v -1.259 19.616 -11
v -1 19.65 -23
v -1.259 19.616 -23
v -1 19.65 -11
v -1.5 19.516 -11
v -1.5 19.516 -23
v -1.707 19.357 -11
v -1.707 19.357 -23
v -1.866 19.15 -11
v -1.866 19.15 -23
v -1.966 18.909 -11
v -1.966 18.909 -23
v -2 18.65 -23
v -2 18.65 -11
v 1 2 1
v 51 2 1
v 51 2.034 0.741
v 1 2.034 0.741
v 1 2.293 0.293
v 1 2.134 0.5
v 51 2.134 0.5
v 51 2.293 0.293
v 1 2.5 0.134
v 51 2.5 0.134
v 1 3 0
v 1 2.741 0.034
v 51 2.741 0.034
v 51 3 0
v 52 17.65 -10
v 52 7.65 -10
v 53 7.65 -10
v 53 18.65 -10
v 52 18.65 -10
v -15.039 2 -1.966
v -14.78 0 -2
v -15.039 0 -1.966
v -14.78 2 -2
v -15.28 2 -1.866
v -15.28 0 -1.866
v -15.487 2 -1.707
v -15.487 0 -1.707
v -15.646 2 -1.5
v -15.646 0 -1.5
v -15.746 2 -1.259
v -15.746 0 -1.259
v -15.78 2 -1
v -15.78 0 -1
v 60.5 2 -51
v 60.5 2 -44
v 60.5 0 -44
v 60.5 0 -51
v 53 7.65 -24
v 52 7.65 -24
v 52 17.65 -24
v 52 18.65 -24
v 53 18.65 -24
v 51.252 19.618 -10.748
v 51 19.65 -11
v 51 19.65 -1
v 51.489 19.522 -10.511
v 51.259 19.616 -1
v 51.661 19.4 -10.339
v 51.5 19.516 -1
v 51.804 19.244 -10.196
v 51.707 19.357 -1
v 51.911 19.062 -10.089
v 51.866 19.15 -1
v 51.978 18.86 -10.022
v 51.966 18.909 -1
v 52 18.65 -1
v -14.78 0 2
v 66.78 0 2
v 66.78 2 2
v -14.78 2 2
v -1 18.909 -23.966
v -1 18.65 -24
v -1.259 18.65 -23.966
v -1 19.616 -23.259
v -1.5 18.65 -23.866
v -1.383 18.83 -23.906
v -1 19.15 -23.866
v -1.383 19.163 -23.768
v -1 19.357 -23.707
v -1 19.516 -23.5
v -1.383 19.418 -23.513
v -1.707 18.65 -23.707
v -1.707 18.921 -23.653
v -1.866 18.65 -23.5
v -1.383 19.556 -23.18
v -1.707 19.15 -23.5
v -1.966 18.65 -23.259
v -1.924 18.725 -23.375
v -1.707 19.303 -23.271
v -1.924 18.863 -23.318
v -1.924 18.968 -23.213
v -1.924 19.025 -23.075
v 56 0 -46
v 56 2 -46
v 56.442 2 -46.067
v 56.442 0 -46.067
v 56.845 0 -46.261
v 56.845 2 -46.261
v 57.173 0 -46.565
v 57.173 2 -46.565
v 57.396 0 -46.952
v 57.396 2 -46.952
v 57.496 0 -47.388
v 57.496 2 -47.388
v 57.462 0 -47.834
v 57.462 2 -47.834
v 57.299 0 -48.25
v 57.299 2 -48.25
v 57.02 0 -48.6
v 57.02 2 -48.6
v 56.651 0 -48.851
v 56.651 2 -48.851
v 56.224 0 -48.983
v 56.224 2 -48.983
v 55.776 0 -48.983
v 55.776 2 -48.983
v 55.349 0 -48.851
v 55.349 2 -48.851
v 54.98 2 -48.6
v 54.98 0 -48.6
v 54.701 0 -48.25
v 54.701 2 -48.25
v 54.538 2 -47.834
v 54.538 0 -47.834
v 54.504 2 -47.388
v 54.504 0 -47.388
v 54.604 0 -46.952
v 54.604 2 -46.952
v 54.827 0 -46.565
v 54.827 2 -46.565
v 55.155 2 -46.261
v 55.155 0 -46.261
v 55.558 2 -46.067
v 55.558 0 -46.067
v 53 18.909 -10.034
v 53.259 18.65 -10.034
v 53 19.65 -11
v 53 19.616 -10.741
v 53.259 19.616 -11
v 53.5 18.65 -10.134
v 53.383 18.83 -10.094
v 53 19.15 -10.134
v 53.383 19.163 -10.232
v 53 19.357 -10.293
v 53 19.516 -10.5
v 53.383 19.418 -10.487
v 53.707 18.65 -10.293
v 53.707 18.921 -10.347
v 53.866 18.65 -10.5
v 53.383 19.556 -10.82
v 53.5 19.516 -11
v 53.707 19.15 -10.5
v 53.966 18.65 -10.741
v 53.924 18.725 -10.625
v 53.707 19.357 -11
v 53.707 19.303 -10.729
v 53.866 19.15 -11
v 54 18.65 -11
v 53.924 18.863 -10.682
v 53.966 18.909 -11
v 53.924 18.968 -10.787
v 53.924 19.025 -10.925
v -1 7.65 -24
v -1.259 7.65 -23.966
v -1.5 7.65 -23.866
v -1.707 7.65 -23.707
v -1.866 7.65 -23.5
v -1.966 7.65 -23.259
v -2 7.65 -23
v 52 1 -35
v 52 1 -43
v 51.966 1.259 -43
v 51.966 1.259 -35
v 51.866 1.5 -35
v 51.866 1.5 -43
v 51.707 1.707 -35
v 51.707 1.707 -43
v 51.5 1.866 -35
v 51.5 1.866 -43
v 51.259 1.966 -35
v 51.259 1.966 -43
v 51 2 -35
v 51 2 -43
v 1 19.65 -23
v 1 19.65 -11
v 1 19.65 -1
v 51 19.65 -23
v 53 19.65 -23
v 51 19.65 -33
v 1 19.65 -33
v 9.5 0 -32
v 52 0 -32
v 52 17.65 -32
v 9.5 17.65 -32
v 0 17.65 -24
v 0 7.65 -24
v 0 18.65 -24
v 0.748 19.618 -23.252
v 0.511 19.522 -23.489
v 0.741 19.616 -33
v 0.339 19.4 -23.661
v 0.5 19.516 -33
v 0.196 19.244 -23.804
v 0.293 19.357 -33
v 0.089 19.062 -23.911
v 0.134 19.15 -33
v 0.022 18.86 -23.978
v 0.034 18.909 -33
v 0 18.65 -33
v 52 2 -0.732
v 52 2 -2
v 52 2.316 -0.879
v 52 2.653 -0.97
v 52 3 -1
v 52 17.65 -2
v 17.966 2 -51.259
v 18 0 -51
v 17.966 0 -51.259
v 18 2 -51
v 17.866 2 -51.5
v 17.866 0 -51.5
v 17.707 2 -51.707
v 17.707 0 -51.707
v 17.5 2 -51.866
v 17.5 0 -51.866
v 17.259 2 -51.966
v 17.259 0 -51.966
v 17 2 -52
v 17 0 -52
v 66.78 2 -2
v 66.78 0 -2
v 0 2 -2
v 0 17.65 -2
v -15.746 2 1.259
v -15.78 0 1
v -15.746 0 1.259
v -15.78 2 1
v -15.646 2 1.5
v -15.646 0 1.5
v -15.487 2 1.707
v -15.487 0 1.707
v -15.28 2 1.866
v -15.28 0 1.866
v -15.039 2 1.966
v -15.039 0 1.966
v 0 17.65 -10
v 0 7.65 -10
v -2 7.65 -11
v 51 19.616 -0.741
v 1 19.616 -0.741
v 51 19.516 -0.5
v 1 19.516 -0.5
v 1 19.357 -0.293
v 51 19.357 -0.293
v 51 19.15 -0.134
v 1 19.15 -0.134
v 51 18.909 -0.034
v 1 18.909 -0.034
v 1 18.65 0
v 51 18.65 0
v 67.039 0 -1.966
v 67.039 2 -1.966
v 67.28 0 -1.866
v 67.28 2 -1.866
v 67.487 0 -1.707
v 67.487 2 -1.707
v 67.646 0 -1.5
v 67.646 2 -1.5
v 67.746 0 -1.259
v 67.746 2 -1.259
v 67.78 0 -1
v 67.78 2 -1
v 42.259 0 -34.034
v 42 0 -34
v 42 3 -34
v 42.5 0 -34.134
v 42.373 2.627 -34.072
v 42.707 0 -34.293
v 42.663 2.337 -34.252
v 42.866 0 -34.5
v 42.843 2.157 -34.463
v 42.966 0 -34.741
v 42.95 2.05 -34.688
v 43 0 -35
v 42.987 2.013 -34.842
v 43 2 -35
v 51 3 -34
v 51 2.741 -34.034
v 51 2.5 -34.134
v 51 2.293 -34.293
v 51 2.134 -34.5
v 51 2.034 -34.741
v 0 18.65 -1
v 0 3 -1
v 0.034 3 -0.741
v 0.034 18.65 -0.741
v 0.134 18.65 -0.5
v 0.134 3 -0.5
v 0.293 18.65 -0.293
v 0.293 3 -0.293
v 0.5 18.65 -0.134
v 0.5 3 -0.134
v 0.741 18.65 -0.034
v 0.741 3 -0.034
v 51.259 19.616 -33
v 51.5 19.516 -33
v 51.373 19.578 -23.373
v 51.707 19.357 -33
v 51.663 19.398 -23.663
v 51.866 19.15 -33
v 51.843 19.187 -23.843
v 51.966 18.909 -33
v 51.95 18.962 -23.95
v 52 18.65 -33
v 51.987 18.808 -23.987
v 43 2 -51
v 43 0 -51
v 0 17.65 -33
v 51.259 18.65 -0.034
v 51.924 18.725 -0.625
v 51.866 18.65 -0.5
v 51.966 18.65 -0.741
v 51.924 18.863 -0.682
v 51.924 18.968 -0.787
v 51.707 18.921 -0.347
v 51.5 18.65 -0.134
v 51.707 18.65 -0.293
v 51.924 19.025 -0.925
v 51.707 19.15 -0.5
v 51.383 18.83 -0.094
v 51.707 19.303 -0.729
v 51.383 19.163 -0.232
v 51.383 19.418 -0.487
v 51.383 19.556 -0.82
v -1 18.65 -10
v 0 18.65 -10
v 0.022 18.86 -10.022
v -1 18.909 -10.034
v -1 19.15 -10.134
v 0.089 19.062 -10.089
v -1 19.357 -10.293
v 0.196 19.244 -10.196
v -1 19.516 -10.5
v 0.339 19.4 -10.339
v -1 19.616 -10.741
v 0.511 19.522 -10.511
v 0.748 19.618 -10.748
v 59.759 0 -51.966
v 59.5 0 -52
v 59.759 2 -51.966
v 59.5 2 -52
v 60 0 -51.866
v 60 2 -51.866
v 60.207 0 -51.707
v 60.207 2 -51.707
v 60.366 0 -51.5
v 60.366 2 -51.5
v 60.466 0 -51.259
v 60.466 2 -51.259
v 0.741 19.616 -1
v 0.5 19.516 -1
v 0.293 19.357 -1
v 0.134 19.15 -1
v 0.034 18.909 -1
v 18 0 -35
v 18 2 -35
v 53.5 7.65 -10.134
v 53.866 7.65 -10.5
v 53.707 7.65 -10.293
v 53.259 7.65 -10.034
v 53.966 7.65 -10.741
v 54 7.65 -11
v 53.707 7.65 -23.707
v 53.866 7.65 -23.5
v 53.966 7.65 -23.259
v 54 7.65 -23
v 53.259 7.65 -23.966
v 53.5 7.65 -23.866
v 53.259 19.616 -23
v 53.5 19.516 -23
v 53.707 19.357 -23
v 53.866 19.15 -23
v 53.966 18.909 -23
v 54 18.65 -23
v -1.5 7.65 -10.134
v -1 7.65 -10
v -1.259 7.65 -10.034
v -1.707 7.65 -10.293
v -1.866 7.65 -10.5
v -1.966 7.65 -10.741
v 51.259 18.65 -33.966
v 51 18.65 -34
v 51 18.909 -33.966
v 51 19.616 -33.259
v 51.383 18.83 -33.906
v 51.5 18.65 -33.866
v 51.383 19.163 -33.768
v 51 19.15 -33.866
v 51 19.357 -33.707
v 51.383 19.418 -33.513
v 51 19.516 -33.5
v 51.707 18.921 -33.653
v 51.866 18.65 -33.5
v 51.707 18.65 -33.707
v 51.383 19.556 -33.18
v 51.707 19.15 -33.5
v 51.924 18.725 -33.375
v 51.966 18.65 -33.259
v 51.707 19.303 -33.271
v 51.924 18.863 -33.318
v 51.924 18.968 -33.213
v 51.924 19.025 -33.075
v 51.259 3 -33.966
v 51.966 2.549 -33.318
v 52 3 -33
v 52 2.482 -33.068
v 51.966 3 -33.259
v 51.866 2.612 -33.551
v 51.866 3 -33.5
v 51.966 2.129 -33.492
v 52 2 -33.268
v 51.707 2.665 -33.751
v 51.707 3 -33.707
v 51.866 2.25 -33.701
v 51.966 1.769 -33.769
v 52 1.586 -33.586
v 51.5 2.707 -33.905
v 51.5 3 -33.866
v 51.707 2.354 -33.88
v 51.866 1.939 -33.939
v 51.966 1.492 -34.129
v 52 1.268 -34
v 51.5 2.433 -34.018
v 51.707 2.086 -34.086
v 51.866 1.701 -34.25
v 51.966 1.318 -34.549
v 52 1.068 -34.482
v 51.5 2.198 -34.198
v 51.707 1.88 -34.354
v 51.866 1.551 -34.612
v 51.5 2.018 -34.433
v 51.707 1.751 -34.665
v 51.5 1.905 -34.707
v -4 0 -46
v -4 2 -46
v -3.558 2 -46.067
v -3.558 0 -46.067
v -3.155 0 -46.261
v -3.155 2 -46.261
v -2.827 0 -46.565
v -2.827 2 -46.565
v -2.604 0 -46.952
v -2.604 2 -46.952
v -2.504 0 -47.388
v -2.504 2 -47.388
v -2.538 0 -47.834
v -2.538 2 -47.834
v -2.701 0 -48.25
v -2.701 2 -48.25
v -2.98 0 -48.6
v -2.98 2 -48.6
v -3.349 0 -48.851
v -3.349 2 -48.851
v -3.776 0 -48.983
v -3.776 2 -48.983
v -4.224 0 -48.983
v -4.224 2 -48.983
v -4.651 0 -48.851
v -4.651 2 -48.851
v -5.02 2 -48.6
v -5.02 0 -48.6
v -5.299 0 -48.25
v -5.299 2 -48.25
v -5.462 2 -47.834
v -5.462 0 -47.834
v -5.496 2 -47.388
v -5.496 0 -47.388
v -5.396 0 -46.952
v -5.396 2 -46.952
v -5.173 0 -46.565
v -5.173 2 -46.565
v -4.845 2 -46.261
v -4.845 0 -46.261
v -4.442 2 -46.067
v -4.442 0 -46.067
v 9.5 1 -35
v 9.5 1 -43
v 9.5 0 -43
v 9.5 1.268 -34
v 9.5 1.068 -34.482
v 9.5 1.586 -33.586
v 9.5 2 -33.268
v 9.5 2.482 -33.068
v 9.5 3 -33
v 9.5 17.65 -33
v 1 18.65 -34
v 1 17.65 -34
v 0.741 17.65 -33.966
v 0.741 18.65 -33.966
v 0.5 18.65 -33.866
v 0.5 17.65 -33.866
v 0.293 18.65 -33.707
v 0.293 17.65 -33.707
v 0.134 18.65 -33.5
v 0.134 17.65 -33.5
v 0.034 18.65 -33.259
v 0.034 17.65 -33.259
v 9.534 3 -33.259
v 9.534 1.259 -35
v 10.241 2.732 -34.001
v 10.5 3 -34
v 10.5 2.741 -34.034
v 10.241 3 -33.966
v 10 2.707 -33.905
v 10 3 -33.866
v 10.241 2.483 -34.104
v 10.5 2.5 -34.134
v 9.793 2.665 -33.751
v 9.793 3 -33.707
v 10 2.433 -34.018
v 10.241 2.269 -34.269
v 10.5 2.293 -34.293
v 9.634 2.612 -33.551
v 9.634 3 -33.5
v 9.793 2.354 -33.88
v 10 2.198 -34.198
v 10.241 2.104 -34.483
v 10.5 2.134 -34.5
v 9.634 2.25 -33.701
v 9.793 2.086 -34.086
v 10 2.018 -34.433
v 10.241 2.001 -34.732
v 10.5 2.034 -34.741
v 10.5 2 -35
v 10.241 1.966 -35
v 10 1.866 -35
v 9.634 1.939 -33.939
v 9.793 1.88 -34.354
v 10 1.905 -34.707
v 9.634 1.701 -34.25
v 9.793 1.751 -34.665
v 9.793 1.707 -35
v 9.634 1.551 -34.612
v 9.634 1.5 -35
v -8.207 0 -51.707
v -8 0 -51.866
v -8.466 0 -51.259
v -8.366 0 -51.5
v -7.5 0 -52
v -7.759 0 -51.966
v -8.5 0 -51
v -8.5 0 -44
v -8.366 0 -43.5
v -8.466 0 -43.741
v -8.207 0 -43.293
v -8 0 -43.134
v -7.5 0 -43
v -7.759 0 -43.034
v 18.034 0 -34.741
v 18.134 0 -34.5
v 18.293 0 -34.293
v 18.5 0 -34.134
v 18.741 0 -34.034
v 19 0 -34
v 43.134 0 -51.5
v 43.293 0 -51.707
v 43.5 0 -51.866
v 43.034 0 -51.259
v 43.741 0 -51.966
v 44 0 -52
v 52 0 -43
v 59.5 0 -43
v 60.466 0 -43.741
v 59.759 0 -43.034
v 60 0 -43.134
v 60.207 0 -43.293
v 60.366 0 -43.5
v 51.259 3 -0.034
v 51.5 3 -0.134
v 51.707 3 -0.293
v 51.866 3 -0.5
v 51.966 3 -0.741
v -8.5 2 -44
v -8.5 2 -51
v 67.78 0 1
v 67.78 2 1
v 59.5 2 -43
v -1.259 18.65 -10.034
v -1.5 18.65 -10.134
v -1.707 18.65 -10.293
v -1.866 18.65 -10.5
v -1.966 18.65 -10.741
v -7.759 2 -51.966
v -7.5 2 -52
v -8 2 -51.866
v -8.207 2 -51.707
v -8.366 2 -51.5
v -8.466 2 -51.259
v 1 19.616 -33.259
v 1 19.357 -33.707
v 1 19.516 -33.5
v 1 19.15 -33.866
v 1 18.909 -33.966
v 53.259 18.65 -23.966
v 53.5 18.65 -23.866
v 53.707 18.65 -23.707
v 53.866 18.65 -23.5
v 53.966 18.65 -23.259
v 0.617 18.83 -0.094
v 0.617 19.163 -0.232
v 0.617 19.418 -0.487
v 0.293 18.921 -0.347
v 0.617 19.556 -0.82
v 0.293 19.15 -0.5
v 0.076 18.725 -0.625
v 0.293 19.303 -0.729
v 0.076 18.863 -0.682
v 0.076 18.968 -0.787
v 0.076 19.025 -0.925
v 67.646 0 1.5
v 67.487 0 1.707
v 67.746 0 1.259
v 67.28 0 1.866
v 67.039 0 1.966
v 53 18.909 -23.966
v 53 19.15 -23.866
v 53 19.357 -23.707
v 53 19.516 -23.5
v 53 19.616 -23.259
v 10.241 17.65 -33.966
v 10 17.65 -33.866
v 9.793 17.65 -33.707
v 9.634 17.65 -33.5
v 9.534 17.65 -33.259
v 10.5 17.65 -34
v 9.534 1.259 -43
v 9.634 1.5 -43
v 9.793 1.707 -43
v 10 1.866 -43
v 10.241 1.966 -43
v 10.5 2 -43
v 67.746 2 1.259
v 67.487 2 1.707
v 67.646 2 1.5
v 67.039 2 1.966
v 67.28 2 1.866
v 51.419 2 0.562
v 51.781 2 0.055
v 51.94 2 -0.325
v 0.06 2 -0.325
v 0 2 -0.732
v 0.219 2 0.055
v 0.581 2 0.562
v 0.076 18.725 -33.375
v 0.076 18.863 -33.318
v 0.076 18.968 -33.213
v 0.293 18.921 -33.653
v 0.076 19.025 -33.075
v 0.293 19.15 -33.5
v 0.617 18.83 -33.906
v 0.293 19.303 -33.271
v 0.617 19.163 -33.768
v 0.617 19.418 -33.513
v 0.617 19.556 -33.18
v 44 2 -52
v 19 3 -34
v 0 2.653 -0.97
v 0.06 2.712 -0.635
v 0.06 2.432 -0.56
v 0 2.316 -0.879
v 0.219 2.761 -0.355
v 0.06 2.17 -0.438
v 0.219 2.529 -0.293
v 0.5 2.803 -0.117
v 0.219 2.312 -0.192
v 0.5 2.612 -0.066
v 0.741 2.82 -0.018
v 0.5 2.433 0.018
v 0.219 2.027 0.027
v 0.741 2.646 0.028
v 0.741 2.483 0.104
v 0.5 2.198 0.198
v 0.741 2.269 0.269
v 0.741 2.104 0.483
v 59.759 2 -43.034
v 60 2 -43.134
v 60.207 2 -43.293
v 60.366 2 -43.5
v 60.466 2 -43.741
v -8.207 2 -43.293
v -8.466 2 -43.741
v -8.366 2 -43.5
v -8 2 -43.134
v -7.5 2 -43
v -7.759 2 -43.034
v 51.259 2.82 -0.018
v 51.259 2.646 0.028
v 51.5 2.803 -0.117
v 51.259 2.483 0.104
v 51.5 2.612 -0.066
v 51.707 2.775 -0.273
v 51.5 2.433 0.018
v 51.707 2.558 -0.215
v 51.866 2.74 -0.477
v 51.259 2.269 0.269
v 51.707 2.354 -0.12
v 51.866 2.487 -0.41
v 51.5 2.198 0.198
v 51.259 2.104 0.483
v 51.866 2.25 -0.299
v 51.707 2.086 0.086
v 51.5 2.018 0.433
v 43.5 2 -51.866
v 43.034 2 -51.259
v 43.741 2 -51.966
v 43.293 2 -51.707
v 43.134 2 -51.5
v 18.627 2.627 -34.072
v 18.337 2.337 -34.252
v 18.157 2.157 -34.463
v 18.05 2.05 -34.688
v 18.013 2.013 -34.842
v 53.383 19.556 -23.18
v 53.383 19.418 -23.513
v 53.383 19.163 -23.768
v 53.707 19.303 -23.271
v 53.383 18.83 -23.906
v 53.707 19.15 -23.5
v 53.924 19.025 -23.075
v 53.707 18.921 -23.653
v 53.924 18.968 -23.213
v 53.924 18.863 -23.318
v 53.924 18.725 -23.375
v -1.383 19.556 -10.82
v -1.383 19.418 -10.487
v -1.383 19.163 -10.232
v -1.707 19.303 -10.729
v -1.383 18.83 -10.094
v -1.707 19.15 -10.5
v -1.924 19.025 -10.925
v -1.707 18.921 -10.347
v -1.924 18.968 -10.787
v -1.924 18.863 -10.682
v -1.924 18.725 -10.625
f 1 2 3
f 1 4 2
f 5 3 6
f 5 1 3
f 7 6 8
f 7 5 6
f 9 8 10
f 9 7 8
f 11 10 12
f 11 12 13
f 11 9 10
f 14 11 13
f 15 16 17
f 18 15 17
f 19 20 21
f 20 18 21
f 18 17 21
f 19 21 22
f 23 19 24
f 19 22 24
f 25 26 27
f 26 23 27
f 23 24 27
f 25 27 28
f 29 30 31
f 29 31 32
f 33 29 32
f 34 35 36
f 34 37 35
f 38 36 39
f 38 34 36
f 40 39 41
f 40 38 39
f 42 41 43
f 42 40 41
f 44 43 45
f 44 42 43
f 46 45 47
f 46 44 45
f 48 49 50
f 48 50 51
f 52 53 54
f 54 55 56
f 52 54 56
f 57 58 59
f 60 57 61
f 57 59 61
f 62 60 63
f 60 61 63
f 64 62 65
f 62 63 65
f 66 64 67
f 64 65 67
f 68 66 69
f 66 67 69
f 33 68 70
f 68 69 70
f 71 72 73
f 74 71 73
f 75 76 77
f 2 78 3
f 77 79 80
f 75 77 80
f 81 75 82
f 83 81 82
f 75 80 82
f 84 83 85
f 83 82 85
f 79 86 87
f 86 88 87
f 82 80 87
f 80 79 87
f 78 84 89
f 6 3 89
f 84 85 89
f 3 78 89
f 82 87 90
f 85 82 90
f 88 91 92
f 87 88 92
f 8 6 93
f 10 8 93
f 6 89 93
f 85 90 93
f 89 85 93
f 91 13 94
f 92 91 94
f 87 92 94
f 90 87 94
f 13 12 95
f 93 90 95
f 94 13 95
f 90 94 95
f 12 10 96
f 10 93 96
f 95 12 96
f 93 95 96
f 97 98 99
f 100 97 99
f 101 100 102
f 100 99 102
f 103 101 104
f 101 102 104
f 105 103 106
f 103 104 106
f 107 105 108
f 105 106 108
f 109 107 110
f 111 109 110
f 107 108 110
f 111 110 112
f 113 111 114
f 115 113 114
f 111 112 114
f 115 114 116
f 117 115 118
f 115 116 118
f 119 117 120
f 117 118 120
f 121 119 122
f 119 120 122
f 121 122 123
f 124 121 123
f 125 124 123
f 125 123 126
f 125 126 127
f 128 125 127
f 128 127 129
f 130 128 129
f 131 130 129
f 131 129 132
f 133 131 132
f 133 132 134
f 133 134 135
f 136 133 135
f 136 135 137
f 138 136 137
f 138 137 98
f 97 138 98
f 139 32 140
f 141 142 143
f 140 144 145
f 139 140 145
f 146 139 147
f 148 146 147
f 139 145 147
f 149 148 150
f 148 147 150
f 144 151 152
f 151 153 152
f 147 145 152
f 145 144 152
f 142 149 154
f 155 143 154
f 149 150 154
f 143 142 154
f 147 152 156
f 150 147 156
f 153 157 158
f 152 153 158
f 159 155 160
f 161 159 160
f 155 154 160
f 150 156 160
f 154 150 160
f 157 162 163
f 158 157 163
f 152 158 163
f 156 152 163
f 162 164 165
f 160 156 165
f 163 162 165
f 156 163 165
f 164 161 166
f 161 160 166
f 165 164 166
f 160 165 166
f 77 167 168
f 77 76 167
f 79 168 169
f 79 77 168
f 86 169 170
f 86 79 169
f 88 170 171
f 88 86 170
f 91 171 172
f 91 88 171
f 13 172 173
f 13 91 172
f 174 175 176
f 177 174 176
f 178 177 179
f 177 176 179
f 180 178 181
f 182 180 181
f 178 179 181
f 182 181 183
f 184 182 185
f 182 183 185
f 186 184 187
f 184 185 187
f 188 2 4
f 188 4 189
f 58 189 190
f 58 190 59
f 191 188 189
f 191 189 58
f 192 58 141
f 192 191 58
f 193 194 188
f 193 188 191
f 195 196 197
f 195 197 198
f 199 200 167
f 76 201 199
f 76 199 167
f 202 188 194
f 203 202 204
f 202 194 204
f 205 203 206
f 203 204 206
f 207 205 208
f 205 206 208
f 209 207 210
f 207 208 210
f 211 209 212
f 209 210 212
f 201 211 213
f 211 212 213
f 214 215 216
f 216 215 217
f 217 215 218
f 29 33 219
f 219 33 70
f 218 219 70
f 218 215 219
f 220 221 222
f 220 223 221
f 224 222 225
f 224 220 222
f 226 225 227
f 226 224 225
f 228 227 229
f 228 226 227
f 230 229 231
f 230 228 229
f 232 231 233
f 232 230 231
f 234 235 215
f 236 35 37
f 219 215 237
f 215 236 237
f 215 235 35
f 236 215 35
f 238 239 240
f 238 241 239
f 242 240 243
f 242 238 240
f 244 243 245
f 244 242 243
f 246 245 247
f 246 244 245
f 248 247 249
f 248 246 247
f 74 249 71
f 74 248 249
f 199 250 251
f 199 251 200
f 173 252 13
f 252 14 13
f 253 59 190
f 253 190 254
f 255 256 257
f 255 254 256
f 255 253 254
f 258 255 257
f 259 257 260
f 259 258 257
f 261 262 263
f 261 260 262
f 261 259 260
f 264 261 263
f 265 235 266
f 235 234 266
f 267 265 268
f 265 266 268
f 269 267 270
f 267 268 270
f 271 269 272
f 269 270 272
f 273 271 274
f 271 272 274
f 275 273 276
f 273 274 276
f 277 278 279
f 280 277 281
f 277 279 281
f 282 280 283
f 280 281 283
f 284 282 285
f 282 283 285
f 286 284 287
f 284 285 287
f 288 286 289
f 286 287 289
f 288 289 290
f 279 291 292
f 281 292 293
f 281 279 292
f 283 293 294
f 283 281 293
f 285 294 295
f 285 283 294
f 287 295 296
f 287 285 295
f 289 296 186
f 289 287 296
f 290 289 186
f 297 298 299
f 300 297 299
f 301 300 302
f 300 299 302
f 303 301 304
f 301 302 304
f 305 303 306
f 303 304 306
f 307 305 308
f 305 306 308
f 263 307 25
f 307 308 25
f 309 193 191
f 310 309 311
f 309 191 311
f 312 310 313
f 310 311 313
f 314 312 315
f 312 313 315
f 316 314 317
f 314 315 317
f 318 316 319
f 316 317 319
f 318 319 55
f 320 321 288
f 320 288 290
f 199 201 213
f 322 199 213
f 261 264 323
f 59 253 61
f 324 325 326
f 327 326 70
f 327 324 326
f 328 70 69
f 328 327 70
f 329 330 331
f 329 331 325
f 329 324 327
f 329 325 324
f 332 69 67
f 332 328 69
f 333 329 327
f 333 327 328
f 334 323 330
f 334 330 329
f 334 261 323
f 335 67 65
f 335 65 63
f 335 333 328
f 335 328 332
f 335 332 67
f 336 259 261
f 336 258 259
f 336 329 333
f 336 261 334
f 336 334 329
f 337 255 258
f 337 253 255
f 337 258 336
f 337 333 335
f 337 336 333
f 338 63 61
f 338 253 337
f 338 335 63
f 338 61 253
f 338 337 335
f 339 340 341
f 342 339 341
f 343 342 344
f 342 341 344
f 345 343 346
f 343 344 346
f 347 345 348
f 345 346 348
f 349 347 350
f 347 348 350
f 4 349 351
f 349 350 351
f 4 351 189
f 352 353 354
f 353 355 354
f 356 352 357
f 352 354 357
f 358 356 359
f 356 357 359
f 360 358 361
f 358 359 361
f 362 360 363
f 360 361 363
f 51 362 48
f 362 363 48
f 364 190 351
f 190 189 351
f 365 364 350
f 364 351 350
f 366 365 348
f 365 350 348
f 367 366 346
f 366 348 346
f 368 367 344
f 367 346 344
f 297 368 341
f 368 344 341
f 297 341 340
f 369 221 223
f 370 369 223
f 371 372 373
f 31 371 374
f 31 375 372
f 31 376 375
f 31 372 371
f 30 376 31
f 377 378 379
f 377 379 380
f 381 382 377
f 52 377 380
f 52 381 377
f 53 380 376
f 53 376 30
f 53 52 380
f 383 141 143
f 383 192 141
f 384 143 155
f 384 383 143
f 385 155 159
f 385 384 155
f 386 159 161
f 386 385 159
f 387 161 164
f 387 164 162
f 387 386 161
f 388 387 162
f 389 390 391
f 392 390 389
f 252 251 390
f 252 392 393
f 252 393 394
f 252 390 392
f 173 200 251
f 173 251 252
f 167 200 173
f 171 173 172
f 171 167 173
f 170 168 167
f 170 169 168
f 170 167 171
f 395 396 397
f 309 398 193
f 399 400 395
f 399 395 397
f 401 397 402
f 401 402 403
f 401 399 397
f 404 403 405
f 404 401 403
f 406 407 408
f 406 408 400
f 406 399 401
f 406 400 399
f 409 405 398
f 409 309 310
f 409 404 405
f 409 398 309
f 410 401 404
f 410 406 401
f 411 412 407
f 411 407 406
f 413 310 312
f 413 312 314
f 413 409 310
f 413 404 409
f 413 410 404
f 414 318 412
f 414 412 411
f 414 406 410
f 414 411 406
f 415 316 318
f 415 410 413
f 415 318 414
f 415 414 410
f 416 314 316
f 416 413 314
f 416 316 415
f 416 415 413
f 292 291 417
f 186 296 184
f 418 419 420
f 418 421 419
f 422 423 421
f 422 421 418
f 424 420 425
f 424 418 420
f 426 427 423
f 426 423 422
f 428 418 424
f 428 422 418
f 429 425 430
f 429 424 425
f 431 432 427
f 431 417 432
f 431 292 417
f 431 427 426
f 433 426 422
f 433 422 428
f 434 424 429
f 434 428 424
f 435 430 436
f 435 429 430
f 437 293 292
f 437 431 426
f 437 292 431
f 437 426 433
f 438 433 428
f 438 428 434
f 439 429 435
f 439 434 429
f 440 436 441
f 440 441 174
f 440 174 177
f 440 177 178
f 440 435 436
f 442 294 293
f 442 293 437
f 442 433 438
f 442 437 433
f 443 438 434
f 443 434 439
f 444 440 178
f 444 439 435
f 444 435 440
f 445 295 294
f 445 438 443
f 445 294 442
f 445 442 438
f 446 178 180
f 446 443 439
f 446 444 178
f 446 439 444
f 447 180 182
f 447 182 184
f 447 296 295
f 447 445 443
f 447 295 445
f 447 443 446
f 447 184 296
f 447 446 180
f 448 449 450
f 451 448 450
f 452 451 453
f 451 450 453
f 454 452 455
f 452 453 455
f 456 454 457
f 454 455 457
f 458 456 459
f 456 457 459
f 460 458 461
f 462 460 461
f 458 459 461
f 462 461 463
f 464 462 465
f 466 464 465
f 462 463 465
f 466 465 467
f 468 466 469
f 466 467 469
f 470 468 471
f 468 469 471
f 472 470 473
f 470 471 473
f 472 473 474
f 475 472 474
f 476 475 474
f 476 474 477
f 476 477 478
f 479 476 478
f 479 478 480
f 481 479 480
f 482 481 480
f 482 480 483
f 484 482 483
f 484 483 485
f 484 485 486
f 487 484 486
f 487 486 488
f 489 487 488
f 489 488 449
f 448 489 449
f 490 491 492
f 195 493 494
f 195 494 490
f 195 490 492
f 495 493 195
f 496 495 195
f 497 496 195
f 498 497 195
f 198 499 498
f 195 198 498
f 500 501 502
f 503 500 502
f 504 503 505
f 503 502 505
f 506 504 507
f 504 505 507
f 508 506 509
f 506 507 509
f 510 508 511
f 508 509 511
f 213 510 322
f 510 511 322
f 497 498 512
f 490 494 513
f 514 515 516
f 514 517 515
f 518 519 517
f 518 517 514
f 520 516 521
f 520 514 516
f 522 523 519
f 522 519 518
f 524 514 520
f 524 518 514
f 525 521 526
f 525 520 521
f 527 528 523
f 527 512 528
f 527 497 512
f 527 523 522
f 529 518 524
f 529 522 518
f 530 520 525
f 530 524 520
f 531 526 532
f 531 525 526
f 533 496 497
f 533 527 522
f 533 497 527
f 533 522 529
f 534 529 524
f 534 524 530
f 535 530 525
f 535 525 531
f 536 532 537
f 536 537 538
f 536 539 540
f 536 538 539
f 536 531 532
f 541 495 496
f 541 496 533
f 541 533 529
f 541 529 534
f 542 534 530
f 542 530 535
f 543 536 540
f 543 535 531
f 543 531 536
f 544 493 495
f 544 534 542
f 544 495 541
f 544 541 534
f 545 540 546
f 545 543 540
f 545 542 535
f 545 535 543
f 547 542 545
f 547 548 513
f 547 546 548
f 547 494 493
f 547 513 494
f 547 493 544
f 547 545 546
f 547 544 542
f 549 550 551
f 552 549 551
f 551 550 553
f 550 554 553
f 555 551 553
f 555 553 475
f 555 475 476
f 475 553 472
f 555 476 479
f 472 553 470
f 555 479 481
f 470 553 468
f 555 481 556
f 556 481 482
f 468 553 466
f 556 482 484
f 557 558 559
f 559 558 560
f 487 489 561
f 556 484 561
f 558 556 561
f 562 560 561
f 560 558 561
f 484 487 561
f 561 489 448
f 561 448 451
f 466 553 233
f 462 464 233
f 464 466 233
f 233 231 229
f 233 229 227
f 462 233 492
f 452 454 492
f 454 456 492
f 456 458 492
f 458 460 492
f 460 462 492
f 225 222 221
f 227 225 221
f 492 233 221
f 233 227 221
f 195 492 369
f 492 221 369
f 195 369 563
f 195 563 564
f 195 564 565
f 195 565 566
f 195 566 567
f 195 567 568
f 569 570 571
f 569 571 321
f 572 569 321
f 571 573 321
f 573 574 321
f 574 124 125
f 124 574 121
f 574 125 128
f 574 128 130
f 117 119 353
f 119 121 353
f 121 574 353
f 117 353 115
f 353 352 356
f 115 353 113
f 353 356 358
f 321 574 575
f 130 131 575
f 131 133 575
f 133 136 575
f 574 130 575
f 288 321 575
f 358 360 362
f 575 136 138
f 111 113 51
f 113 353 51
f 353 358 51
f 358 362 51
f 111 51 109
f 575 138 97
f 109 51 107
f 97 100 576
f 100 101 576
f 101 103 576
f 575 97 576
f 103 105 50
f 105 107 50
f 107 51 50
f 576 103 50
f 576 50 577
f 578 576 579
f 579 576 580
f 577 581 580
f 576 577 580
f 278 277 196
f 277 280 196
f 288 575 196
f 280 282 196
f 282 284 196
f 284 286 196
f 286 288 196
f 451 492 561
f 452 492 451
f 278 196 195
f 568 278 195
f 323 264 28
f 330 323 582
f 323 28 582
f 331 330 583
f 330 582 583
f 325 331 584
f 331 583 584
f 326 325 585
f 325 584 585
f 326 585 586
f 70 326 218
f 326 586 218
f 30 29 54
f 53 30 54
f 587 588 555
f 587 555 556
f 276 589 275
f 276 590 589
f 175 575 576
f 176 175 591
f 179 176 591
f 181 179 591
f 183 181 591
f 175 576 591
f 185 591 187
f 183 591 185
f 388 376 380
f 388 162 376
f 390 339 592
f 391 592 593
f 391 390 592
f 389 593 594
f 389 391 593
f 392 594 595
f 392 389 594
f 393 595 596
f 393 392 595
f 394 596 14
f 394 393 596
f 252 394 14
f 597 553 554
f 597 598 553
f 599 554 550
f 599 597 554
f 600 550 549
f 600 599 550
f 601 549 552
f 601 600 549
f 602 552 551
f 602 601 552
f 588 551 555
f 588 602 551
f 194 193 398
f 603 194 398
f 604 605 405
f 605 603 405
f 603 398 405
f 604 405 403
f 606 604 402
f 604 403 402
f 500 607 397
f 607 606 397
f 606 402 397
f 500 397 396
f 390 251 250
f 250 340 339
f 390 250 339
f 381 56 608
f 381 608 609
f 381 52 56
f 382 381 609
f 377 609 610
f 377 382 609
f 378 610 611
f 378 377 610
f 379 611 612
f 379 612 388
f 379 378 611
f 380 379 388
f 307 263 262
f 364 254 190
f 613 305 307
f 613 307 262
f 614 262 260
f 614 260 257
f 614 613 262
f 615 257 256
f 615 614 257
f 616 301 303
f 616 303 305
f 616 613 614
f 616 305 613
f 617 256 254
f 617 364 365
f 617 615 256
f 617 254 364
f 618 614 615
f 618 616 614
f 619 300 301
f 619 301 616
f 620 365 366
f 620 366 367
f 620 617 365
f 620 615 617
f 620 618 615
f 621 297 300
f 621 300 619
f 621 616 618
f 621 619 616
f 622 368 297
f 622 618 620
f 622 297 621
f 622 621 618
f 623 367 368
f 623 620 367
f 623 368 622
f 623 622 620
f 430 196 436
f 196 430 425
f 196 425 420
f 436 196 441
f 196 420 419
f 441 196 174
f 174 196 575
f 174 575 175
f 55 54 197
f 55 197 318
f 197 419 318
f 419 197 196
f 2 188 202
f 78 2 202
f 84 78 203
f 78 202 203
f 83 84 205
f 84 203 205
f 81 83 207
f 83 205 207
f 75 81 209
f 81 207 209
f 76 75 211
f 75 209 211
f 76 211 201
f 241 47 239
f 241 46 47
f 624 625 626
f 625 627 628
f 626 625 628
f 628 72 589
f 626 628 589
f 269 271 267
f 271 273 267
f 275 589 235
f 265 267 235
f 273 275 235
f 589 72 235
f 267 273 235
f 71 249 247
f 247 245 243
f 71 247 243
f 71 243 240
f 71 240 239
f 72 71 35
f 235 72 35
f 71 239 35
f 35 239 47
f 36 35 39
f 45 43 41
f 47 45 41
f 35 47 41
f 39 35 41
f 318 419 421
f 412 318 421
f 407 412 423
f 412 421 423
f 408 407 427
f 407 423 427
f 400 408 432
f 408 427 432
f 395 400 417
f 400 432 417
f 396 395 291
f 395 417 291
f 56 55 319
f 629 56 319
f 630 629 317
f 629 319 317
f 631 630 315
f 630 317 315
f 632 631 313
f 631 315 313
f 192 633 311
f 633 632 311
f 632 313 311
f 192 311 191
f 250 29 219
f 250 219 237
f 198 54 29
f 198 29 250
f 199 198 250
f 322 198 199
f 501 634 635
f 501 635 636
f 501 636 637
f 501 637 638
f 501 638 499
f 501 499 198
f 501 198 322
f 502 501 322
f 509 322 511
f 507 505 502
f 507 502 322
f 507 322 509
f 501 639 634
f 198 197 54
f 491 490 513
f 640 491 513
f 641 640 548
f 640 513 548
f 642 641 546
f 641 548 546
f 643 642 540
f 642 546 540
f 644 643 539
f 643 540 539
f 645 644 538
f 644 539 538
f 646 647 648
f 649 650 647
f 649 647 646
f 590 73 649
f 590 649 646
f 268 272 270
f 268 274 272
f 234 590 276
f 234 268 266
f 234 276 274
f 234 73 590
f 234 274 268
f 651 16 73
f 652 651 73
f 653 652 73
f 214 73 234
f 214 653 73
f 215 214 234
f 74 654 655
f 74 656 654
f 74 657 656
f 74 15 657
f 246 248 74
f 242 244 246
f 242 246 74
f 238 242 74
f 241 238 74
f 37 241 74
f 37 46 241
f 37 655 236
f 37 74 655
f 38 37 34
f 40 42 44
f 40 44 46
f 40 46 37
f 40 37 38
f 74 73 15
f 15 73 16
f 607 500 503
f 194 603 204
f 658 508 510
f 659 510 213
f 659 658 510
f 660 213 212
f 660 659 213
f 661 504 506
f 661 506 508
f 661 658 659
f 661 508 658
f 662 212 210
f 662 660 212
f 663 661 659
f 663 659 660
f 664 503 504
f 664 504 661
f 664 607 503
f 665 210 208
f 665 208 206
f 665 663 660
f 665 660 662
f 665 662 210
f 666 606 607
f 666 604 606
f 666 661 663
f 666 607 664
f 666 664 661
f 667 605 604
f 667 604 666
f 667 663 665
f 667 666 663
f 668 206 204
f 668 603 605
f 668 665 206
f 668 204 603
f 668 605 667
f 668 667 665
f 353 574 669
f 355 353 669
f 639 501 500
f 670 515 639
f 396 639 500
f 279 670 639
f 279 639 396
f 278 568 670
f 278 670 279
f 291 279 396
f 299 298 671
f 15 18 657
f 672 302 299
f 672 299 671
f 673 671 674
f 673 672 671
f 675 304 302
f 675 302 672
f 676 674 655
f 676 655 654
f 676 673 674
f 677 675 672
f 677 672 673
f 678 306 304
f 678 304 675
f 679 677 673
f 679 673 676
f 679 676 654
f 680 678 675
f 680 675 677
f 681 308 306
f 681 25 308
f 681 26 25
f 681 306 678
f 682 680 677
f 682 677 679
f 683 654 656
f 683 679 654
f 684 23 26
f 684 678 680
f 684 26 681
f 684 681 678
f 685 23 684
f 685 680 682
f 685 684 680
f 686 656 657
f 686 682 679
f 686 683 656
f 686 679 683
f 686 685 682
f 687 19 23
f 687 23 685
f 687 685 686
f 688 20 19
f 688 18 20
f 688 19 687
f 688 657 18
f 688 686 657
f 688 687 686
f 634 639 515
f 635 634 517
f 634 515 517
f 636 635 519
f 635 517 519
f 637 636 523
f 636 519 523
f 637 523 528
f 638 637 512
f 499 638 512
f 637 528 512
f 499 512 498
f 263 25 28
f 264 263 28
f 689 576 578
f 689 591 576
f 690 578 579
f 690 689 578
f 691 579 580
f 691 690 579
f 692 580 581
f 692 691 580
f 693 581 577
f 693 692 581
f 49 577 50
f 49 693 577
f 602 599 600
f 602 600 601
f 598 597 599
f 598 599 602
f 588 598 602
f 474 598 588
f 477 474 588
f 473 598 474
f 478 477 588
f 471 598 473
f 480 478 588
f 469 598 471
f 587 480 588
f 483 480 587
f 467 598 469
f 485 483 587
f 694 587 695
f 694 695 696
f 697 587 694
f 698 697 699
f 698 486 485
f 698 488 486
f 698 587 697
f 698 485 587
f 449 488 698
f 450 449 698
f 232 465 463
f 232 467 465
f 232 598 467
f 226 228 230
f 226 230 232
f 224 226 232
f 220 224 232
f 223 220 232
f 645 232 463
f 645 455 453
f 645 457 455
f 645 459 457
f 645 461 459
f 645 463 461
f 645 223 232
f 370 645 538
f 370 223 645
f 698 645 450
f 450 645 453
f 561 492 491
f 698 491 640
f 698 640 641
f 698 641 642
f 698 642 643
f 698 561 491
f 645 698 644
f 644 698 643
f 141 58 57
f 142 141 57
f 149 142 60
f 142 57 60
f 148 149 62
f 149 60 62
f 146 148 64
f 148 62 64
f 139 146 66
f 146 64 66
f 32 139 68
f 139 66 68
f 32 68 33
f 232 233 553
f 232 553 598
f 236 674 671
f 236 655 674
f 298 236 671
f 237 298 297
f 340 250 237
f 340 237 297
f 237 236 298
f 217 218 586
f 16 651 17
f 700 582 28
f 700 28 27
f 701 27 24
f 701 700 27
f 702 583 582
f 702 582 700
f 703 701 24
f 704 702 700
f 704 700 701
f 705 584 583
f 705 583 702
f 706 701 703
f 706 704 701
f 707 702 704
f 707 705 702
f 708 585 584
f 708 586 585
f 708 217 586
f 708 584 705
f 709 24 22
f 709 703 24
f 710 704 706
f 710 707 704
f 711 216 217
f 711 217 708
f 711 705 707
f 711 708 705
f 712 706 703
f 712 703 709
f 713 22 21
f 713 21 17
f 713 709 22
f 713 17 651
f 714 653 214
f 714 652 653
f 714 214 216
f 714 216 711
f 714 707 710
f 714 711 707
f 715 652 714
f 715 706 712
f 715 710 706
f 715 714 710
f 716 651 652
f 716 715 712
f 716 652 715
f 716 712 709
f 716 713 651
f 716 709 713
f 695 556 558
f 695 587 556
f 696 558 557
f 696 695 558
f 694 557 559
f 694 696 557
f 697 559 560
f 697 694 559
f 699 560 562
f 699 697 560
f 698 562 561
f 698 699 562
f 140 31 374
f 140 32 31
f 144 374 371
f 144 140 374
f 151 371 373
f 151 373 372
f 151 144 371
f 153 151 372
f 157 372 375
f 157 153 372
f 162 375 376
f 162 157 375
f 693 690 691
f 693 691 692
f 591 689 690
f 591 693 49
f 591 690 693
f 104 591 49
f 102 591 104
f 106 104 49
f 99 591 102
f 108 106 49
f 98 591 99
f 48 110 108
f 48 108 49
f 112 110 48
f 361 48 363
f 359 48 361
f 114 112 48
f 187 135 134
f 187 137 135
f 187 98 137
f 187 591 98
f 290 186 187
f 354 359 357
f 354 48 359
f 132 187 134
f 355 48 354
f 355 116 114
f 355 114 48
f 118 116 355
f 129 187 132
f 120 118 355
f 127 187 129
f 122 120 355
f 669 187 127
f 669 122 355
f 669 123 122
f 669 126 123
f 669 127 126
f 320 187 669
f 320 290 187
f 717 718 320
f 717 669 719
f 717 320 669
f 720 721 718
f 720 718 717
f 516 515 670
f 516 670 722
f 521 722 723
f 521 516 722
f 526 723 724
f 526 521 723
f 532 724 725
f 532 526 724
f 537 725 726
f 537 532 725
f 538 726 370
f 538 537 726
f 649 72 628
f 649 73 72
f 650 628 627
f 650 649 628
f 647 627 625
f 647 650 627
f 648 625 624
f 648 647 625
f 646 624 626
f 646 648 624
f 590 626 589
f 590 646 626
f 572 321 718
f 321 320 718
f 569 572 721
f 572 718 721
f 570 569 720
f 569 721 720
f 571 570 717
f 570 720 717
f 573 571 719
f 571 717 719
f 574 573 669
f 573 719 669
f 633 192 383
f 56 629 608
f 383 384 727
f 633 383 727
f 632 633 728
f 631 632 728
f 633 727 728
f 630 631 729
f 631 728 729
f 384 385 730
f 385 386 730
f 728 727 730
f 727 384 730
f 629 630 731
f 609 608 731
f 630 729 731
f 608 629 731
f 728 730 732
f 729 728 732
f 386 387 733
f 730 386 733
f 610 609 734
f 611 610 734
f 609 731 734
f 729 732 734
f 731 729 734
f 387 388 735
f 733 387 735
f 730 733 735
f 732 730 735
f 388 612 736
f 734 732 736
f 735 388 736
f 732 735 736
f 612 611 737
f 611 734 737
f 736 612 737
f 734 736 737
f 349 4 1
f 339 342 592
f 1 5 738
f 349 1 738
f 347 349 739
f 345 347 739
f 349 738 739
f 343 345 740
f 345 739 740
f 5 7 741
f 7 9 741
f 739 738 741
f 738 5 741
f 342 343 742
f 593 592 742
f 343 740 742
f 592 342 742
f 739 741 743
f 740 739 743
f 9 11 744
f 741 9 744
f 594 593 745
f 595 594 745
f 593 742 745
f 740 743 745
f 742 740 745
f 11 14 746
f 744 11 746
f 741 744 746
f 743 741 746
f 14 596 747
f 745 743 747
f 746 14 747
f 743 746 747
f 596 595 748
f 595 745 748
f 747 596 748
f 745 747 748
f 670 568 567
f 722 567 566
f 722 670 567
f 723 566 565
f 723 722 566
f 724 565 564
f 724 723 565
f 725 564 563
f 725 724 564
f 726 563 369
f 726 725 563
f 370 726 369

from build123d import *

# Parameters (mm, degrees)
SKETCH1_W            = 52
SKETCH1_H            = 34
BOSS_EXTRUDE1_DEPTH  = 19.65
SKETCH2_W            = 52
SKETCH2_H            = 30
CUT_EXTRUDE1_DEPTH   = 17.65
SKETCH3_W            = 9
SKETCH3_H            = 2
SKETCH3_W_2          = 18
BOSS_EXTRUDE2_DEPTH  = 18
SKETCH4_W            = 18
SKETCH4_H            = 2
BOSS_EXTRUDE3_DEPTH  = 8.5
SKETCH5_W            = 18
SKETCH5_H            = 2
BOSS_EXTRUDE4_DEPTH  = 8.5
SKETCH6_R            = 1.5
CUT_EXTRUDE2_DEPTH   = 82.705400678
SKETCH7_W            = 52
SKETCH7_H            = 2
BOSS_EXTRUDE5_DEPTH  = 2
SKETCH8_W            = 4
SKETCH8_H            = 2
BOSS_EXTRUDE6_DEPTH  = 15.78
SKETCH9_W            = 4
SKETCH9_H            = 2
BOSS_EXTRUDE7_DEPTH  = 15.78
SKETCH11_W           = 11
SKETCH11_H           = 17.65
CUT_EXTRUDE3_DEPTH   = 18
SKETCH12_W           = 9
SKETCH12_H           = 2
CUT_EXTRUDE4_DEPTH   = 8.5
SKETCH14_W           = 14
SKETCH14_H           = 2
BOSS_EXTRUDE8_DEPTH  = 2
SKETCH15_W           = 14
SKETCH15_H           = 2
BOSS_EXTRUDE9_DEPTH  = 2
SKETCH16_W           = 2
SKETCH16_H           = 14
BOSS_EXTRUDE10_DEPTH = 10
FILLET1_R            = 1
FILLET2_R            = 1
FILLET3_R            = 1
FILLET4_R            = 1


with BuildPart() as part:
    # Sketch1 → Boss-Extrude1 (new body)
    with BuildSketch(Plane(origin=(0, 0, 0), x_dir=(1, 0, 0), z_dir=(0, 1, 0))):
        with Locations((26, 17)):
            Rectangle(SKETCH1_W, SKETCH1_H)
    extrude(amount=BOSS_EXTRUDE1_DEPTH)

    # Sketch2 → Cut-Extrude1 (cut)
    with BuildSketch(Plane(origin=(0, 0, 0), x_dir=(-1, 0, 0), z_dir=(0, -1, 0))):
        with Locations((-26, 17)):
            Rectangle(SKETCH2_W, SKETCH2_H)
    extrude(amount=-CUT_EXTRUDE1_DEPTH, mode=Mode.SUBTRACT)

    # Sketch3 → Boss-Extrude2 (add)
    with BuildSketch(Plane(origin=(0, 0, -34), x_dir=(-1, 0, 0), z_dir=(0, 0, -1))):
        with Locations((-47.5, 1)):
            Rectangle(SKETCH3_W, SKETCH3_H)
        with Locations((-9, 1)):
            Rectangle(SKETCH3_W_2, SKETCH3_H)
    extrude(amount=BOSS_EXTRUDE2_DEPTH)

    # Sketch4 → Boss-Extrude3 (add)
    with BuildSketch(Plane(origin=(52, 0, 0), x_dir=(0, 0, -1), z_dir=(1, 0, 0))):
        with Locations((43, 1)):
            Rectangle(SKETCH4_W, SKETCH4_H)
    extrude(amount=BOSS_EXTRUDE3_DEPTH)

    # Sketch5 → Boss-Extrude4 (add)
    with BuildSketch(Plane.ZY):
        with Locations((-43, 1)):
            Rectangle(SKETCH5_W, SKETCH5_H)
    extrude(amount=BOSS_EXTRUDE4_DEPTH)

    # Sketch6 → Cut-Extrude2 (cut, through all)
    with BuildSketch(Plane(origin=(0, 2, 0), x_dir=(1, 0, 0), z_dir=(0, 1, 0))):
        with Locations(Location((56, 47.5, 0), (0, 0, 270))):
            Circle(SKETCH6_R)
        with Locations(Location((-4, 47.5, 0), (0, 0, 270))):
            Circle(SKETCH6_R)
    extrude(amount=-CUT_EXTRUDE2_DEPTH, mode=Mode.SUBTRACT)

    # Sketch7 → Boss-Extrude5 (add)
    with BuildSketch(Plane.XY):
        with Locations((26, 1)):
            Rectangle(SKETCH7_W, SKETCH7_H)
    extrude(amount=BOSS_EXTRUDE5_DEPTH)

    # Sketch8 → Boss-Extrude6 (add)
    with BuildSketch(Plane.ZY):
        with Locations((0, 1)):
            Rectangle(SKETCH8_W, SKETCH8_H)
    extrude(amount=BOSS_EXTRUDE6_DEPTH)

    # Sketch9 → Boss-Extrude7 (add)
    with BuildSketch(Plane(origin=(52, 0, 0), x_dir=(0, 0, -1), z_dir=(1, 0, 0))):
        with Locations((0, 1)):
            Rectangle(SKETCH9_W, SKETCH9_H)
    extrude(amount=BOSS_EXTRUDE7_DEPTH)

    # Sketch11 → Cut-Extrude3 (cut)
    with BuildSketch(Plane.ZY.offset(8.5)):
        with Locations((-37.5, 8.825)):
            Rectangle(SKETCH11_W, SKETCH11_H)
    extrude(amount=-CUT_EXTRUDE3_DEPTH, mode=Mode.SUBTRACT)

    # Sketch12 → Cut-Extrude4 (cut)
    with BuildSketch(Plane(origin=(60.5, 0, 0), x_dir=(0, 0, -1), z_dir=(1, 0, 0))):
        with Locations((38.5, 1)):
            Rectangle(SKETCH12_W, SKETCH12_H)
    extrude(amount=-CUT_EXTRUDE4_DEPTH, mode=Mode.SUBTRACT)

    # Sketch14 → Boss-Extrude8 (add)
    with BuildSketch(Plane.ZY):
        with Locations((-17, 18.65)):
            Rectangle(SKETCH14_W, SKETCH14_H)
    extrude(amount=BOSS_EXTRUDE8_DEPTH)

    # Sketch15 → Boss-Extrude9 (add)
    with BuildSketch(Plane(origin=(52, 0, 0), x_dir=(0, 0, -1), z_dir=(1, 0, 0))):
        with Locations((17, 18.65)):
            Rectangle(SKETCH15_W, SKETCH15_H)
    extrude(amount=BOSS_EXTRUDE9_DEPTH)

    # Sketch16 → Boss-Extrude10 (add)
    with BuildSketch(Plane(origin=(0, 17.65, 0), x_dir=(-1, 0, 0), z_dir=(0, -1, 0))):
        with Locations((1, 17)):
            Rectangle(SKETCH16_W, SKETCH16_H)
        with Locations((-53, 17)):
            Rectangle(SKETCH16_W, SKETCH16_H)
    extrude(amount=BOSS_EXTRUDE10_DEPTH)

    # Fillet1
    fillet1_edges = [part.edges().sort_by_distance(p)[0] for p in [
        (13.75, 2, -34),
        (26, 19.65, -34),
        (43, 1, -34),
        (47.5, 2, -34),
        (18, 1, -34),
        (26, 19.65, 0),
        (26, 2, 0),
    ]]
    fillet(fillet1_edges, radius=FILLET1_R)

    # Fillet2
    # the kernel refuses this fillet: 1 mm, written as the material it takes off along each edge
    with BuildSketch(Plane(origin=(9.5, 2, -35), x_dir=(0, -1, 0), z_dir=(0, 0, -1))) as fillet2_piece_1:
        with BuildLine():
            CenterArc((FILLET2_R, -FILLET2_R), FILLET2_R, 90, 90)
            Line((0, -FILLET2_R), (0, 0))
            Line((0, 0), (FILLET2_R, 0))
        make_face()
    extrude(amount=8, mode=Mode.SUBTRACT)
    with BuildSketch(Plane(origin=(9.5, 3, -35), x_dir=(0, 0, 1), z_dir=(0, 1, 0))) as fillet2_piece_2:
        with BuildLine():
            CenterArc((1 + FILLET2_R, FILLET2_R), FILLET2_R, 180, 90)
            Line((1, FILLET2_R), (1, 0))
            Line((1, 0), (1 + FILLET2_R, 0))
        make_face()
    revolve(axis=Axis((9.5, 3, -35), (1, 0, 0)), revolution_arc=90, mode=Mode.SUBTRACT)
    with BuildSketch(Plane(origin=(0, 15.15, -34), x_dir=(0, 0, 1), z_dir=(0, 1, 0))) as fillet2_piece_3:
        with BuildLine():
            CenterArc((FILLET2_R, FILLET2_R), FILLET2_R, 180, 90)
            Line((0, FILLET2_R), (0, 0))
            Line((0, 0), (FILLET2_R, 0))
        make_face()
    extrude(amount=3.5, mode=Mode.SUBTRACT)
    with BuildSketch(Plane(origin=(0, 18.65, -33), x_dir=(0, 0, -1), z_dir=(0, -1, 0))) as fillet2_piece_4:
        with BuildLine():
            CenterArc((1 - FILLET2_R, FILLET2_R), FILLET2_R, 270, 90)
            Line((1, FILLET2_R), (1, 0))
            Line((1, 0), (1 - FILLET2_R, 0))
        make_face()
    revolve(axis=Axis((0, 18.65, -33), (1, 0, 0)), revolution_arc=90, mode=Mode.SUBTRACT)
    with BuildSketch(Plane(origin=(0, 3, 1), x_dir=(0, 0, -1), z_dir=(0, 1, 0))) as fillet2_piece_5_section:
        with BuildLine():
            CenterArc((1 + FILLET2_R, -FILLET2_R), FILLET2_R, 90, 90)
            Line((1, -FILLET2_R), (1, 0))
            Line((1, 0), (1 + FILLET2_R, 0))
        make_face()
    fillet2_piece_5 = revolve(axis=Axis((0, 3, 1), (-1, 0, 0)), revolution_arc=233.296989237, mode=Mode.PRIVATE)
    fillet2_piece_5 = split(fillet2_piece_5, bisect_by=Plane(origin=(0, 2, 1), z_dir=(0, 1, 0)), keep=Keep.TOP, mode=Mode.PRIVATE)
    add(fillet2_piece_5, mode=Mode.SUBTRACT)
    with BuildSketch(Plane(origin=(0, 3, 0), x_dir=(1, 0, 0), z_dir=(0, 1, 0)), Plane(origin=(52, 3, -34), x_dir=(-1, 0, 0), z_dir=(0, 1, 0))) as fillet2_piece_6:
        with BuildLine():
            CenterArc((FILLET2_R, FILLET2_R), FILLET2_R, 180, 90)
            Line((0, FILLET2_R), (0, 0))
            Line((0, 0), (FILLET2_R, 0))
        make_face()
    extrude(amount=15.65, mode=Mode.SUBTRACT)
    with BuildSketch(Plane(origin=(0, 18.65, -1), x_dir=(0, 0, 1), z_dir=(0, -1, 0))) as fillet2_piece_7:
        with BuildLine():
            CenterArc((1 - FILLET2_R, -FILLET2_R), FILLET2_R, 0, 90)
            Line((1, -FILLET2_R), (1, 0))
            Line((1, 0), (1 - FILLET2_R, 0))
        make_face()
    revolve(axis=Axis((0, 18.65, -1), (-1, 0, 0)), revolution_arc=90, mode=Mode.SUBTRACT)
    with BuildSketch(Plane(origin=(52, 2, -43), x_dir=(-1, 0, 0), z_dir=(0, 0, 1))) as fillet2_piece_8:
        with BuildLine():
            CenterArc((FILLET2_R, FILLET2_R), FILLET2_R, 180, 90)
            Line((0, FILLET2_R), (0, 0))
            Line((0, 0), (FILLET2_R, 0))
        make_face()
    extrude(amount=8, mode=Mode.SUBTRACT)
    with BuildSketch(Plane(origin=(52, 3, -35), x_dir=(0, 0, 1), z_dir=(0, 1, 0))) as fillet2_piece_9:
        with BuildLine():
            CenterArc((1 + FILLET2_R, -FILLET2_R), FILLET2_R, 90, 90)
            Line((1 + FILLET2_R, 0), (1, 0))
            Line((1, 0), (1, -FILLET2_R))
        make_face()
    revolve(axis=Axis((52, 3, -35), (1, 0, 0)), revolution_arc=90, mode=Mode.SUBTRACT)
    with BuildSketch(Plane(origin=(52, 18.65, -33), x_dir=(0, 0, -1), z_dir=(0, -1, 0))) as fillet2_piece_10:
        with BuildLine():
            CenterArc((1 - FILLET2_R, -FILLET2_R), FILLET2_R, 0, 90)
            Line((1 - FILLET2_R, 0), (1, 0))
            Line((1, 0), (1, -FILLET2_R))
        make_face()
    revolve(axis=Axis((52, 18.65, -33), (1, 0, 0)), revolution_arc=90, mode=Mode.SUBTRACT)
    with BuildSketch(Plane(origin=(52, 3, 1), x_dir=(0, 0, -1), z_dir=(0, 1, 0))) as fillet2_piece_11_section:
        with BuildLine():
            CenterArc((1 + FILLET2_R, FILLET2_R), FILLET2_R, 180, 90)
            Line((1 + FILLET2_R, 0), (1, 0))
            Line((1, 0), (1, FILLET2_R))
        make_face()
    fillet2_piece_11 = revolve(axis=Axis((52, 3, 1), (-1, 0, 0)), revolution_arc=233.296989237, mode=Mode.PRIVATE)
    fillet2_piece_11 = split(fillet2_piece_11, bisect_by=Plane(origin=(52, 2, 1), z_dir=(0, 1, 0)), keep=Keep.TOP, mode=Mode.PRIVATE)
    add(fillet2_piece_11, mode=Mode.SUBTRACT)
    with BuildSketch(Plane(origin=(52, 3, 0), x_dir=(-1, 0, 0), z_dir=(0, 1, 0))) as fillet2_piece_12:
        with BuildLine():
            CenterArc((FILLET2_R, -FILLET2_R), FILLET2_R, 90, 90)
            Line((0, -FILLET2_R), (0, 0))
            Line((0, 0), (FILLET2_R, 0))
        make_face()
    extrude(amount=15.65, mode=Mode.SUBTRACT)
    with BuildSketch(Plane(origin=(52, 18.65, -1), x_dir=(0, 0, 1), z_dir=(0, -1, 0))) as fillet2_piece_13:
        with BuildLine():
            CenterArc((1 - FILLET2_R, FILLET2_R), FILLET2_R, 270, 90)
            Line((1 - FILLET2_R, 0), (1, 0))
            Line((1, 0), (1, FILLET2_R))
        make_face()
    revolve(axis=Axis((52, 18.65, -1), (-1, 0, 0)), revolution_arc=90, mode=Mode.SUBTRACT)
    with BuildSketch(Plane(origin=(9.5, 3, -34), x_dir=(1, 0, 0), z_dir=(0, 1, 0))) as fillet2_piece_14:
        with BuildLine():
            CenterArc((FILLET2_R, -FILLET2_R), FILLET2_R, 90, 90)
            Line((0, -FILLET2_R), (0, 0))
            Line((0, 0), (FILLET2_R, 0))
        make_face()
    extrude(amount=14.65, mode=Mode.SUBTRACT)
    with BuildSketch(Plane(origin=(0, 19.65, -24), x_dir=(0, 0, 1), z_dir=(-1, 0, 0)), Plane(origin=(52, 19.65, -10), x_dir=(0, 0, -1), z_dir=(1, 0, 0))) as fillet2_piece_15:
        with BuildLine():
            CenterArc((FILLET2_R, -FILLET2_R), FILLET2_R, 90, 90)
            Line((0, -FILLET2_R), (0, 0))
            Line((0, 0), (FILLET2_R, 0))
        make_face()
    extrude(amount=4.5, mode=Mode.SUBTRACT)
    with BuildSketch(Plane(origin=(0, 19.65, -33), x_dir=(1, 0, 0), z_dir=(0, 0, 1)), Plane(origin=(52, 19.65, -24), x_dir=(-1, 0, 0), z_dir=(0, 0, -1)), Plane(origin=(52, 19.65, -1), x_dir=(-1, 0, 0), z_dir=(0, 0, -1))) as fillet2_piece_16:
        with BuildLine():
            CenterArc((FILLET2_R, -FILLET2_R), FILLET2_R, 90, 90)
            Line((0, -FILLET2_R), (0, 0))
            Line((0, 0), (FILLET2_R, 0))
        make_face()
    extrude(amount=9, mode=Mode.SUBTRACT)
    with BuildSketch(Plane(origin=(0, 19.65, -10), x_dir=(0, 0, -1), z_dir=(-1, 0, 0)), Plane(origin=(52, 19.65, -24), x_dir=(0, 0, 1), z_dir=(1, 0, 0))) as fillet2_piece_17:
        with BuildLine():
            CenterArc((FILLET2_R, FILLET2_R), FILLET2_R, 180, 90)
            Line((0, FILLET2_R), (0, 0))
            Line((0, 0), (FILLET2_R, 0))
        make_face()
    extrude(amount=4.5, mode=Mode.SUBTRACT)
    with BuildSketch(Plane(origin=(0, 19.65, -10), x_dir=(0, -1, 0), z_dir=(0, 0, 1))) as fillet2_piece_18:
        with BuildLine():
            CenterArc((FILLET2_R, FILLET2_R), FILLET2_R, 180, 90)
            Line((0, FILLET2_R), (0, 0))
            Line((0, 0), (FILLET2_R, 0))
        make_face()
    extrude(amount=9, mode=Mode.SUBTRACT)
    with BuildSketch(Plane(origin=(2.5, 19.65, -24), x_dir=(0, 0, 1), z_dir=(-1, 0, 0))) as fillet2_piece_19a_section:
        with BuildLine():
            CenterArc((FILLET2_R, -FILLET2_R), FILLET2_R, 90, 90)
            Line((0, -FILLET2_R), (0, 0))
            Line((0, 0), (FILLET2_R, 0))
        make_face()
    fillet2_piece_19a = extrude(amount=4.5, mode=Mode.PRIVATE)
    fillet2_piece_19a = split(fillet2_piece_19a, bisect_by=Plane(origin=(0, 19.65, -24), z_dir=(1, 0, 0)), keep=Keep.TOP, mode=Mode.PRIVATE)
    with BuildSketch(Plane(origin=(0, 19.65, -33), x_dir=(1, 0, 0), z_dir=(0, 0, 1))) as fillet2_piece_19b_section:
        with BuildLine():
            CenterArc((FILLET2_R, -FILLET2_R), FILLET2_R, 90, 90)
            Line((0, -FILLET2_R), (0, 0))
            Line((0, 0), (FILLET2_R, 0))
        make_face()
    fillet2_piece_19b = extrude(amount=11.5, mode=Mode.PRIVATE)
    fillet2_piece_19b = split(fillet2_piece_19b, bisect_by=Plane(origin=(0, 19.65, -24), z_dir=(0, 0, 1)), keep=Keep.TOP, mode=Mode.PRIVATE)
    fillet2_piece_19 = fillet2_piece_19a & fillet2_piece_19b
    add(fillet2_piece_19, mode=Mode.SUBTRACT)
    with BuildSketch(Plane(origin=(0, 19.65, -12.5), x_dir=(0, -1, 0), z_dir=(0, 0, 1))) as fillet2_piece_20a_section:
        with BuildLine():
            CenterArc((FILLET2_R, FILLET2_R), FILLET2_R, 180, 90)
            Line((0, FILLET2_R), (0, 0))
            Line((0, 0), (FILLET2_R, 0))
        make_face()
    fillet2_piece_20a = extrude(amount=11.5, mode=Mode.PRIVATE)
    fillet2_piece_20a = split(fillet2_piece_20a, bisect_by=Plane(origin=(0, 19.65, -10), z_dir=(0, 0, -1)), keep=Keep.TOP, mode=Mode.PRIVATE)
    with BuildSketch(Plane(origin=(2.5, 19.65, -10), x_dir=(0, 0, -1), z_dir=(-1, 0, 0))) as fillet2_piece_20b_section:
        with BuildLine():
            CenterArc((FILLET2_R, FILLET2_R), FILLET2_R, 180, 90)
            Line((0, FILLET2_R), (0, 0))
            Line((0, 0), (FILLET2_R, 0))
        make_face()
    fillet2_piece_20b = extrude(amount=4.5, mode=Mode.PRIVATE)
    fillet2_piece_20b = split(fillet2_piece_20b, bisect_by=Plane(origin=(0, 19.65, -10), z_dir=(1, 0, 0)), keep=Keep.TOP, mode=Mode.PRIVATE)
    fillet2_piece_20 = fillet2_piece_20a & fillet2_piece_20b
    add(fillet2_piece_20, mode=Mode.SUBTRACT)
    with BuildSketch(Plane(origin=(49.5, 19.65, -24), x_dir=(0, 0, 1), z_dir=(1, 0, 0))) as fillet2_piece_21a_section:
        with BuildLine():
            CenterArc((FILLET2_R, FILLET2_R), FILLET2_R, 180, 90)
            Line((0, FILLET2_R), (0, 0))
            Line((0, 0), (FILLET2_R, 0))
        make_face()
    fillet2_piece_21a = extrude(amount=4.5, mode=Mode.PRIVATE)
    fillet2_piece_21a = split(fillet2_piece_21a, bisect_by=Plane(origin=(52, 19.65, -24), z_dir=(-1, 0, 0)), keep=Keep.TOP, mode=Mode.PRIVATE)
    with BuildSketch(Plane(origin=(52, 19.65, -21.5), x_dir=(-1, 0, 0), z_dir=(0, 0, -1))) as fillet2_piece_21b_section:
        with BuildLine():
            CenterArc((FILLET2_R, -FILLET2_R), FILLET2_R, 90, 90)
            Line((0, -FILLET2_R), (0, 0))
            Line((0, 0), (FILLET2_R, 0))
        make_face()
    fillet2_piece_21b = extrude(amount=11.5, mode=Mode.PRIVATE)
    fillet2_piece_21b = split(fillet2_piece_21b, bisect_by=Plane(origin=(52, 19.65, -24), z_dir=(0, 0, 1)), keep=Keep.TOP, mode=Mode.PRIVATE)
    fillet2_piece_21 = fillet2_piece_21a & fillet2_piece_21b
    add(fillet2_piece_21, mode=Mode.SUBTRACT)
    with BuildSketch(Plane(origin=(52, 19.65, -1), x_dir=(-1, 0, 0), z_dir=(0, 0, -1))) as fillet2_piece_22a_section:
        with BuildLine():
            CenterArc((FILLET2_R, -FILLET2_R), FILLET2_R, 90, 90)
            Line((0, -FILLET2_R), (0, 0))
            Line((0, 0), (FILLET2_R, 0))
        make_face()
    fillet2_piece_22a = extrude(amount=11.5, mode=Mode.PRIVATE)
    fillet2_piece_22a = split(fillet2_piece_22a, bisect_by=Plane(origin=(52, 19.65, -10), z_dir=(0, 0, -1)), keep=Keep.TOP, mode=Mode.PRIVATE)
    with BuildSketch(Plane(origin=(49.5, 19.65, -10), x_dir=(0, 0, -1), z_dir=(1, 0, 0))) as fillet2_piece_22b_section:
        with BuildLine():
            CenterArc((FILLET2_R, -FILLET2_R), FILLET2_R, 90, 90)
            Line((0, -FILLET2_R), (0, 0))
            Line((0, 0), (FILLET2_R, 0))
        make_face()
    fillet2_piece_22b = extrude(amount=4.5, mode=Mode.PRIVATE)
    fillet2_piece_22b = split(fillet2_piece_22b, bisect_by=Plane(origin=(52, 19.65, -10), z_dir=(-1, 0, 0)), keep=Keep.TOP, mode=Mode.PRIVATE)
    fillet2_piece_22 = fillet2_piece_22a & fillet2_piece_22b
    add(fillet2_piece_22, mode=Mode.SUBTRACT)

    # Fillet3
    fillet3_edges = [part.edges().sort_by_distance(p)[0] for p in [
        (-2, 13.15, -10),
        (54, 13.15, -24),
        (-2, 13.15, -24),
        (-2, 19.65, -17),
        (54, 19.65, -17),
        (-2, 19.357106781, -10.292893219),
        (-2, 19.357106781, -23.707106781),
        (54, 13.15, -10),
        (54, 19.357106781, -10.292893219),
        (54, 19.357106781, -23.707106781),
    ]]
    fillet(fillet3_edges, radius=FILLET3_R)

    # Fillet4
    fillet4_edges = [part.edges().sort_by_distance(p)[0] for p in [
        (-15.78, 1, 2),
        (-15.78, 1, -2),
        (67.78, 1, 2),
        (67.78, 1, -2),
        (-8.5, 1, -43),
        (60.5, 1, -43),
        (43, 1, -52),
        (18, 1, -52),
        (60.5, 1, -52),
        (-8.5, 1, -52),
    ]]
    fillet(fillet4_edges, radius=FILLET4_R)


solid = part.part
